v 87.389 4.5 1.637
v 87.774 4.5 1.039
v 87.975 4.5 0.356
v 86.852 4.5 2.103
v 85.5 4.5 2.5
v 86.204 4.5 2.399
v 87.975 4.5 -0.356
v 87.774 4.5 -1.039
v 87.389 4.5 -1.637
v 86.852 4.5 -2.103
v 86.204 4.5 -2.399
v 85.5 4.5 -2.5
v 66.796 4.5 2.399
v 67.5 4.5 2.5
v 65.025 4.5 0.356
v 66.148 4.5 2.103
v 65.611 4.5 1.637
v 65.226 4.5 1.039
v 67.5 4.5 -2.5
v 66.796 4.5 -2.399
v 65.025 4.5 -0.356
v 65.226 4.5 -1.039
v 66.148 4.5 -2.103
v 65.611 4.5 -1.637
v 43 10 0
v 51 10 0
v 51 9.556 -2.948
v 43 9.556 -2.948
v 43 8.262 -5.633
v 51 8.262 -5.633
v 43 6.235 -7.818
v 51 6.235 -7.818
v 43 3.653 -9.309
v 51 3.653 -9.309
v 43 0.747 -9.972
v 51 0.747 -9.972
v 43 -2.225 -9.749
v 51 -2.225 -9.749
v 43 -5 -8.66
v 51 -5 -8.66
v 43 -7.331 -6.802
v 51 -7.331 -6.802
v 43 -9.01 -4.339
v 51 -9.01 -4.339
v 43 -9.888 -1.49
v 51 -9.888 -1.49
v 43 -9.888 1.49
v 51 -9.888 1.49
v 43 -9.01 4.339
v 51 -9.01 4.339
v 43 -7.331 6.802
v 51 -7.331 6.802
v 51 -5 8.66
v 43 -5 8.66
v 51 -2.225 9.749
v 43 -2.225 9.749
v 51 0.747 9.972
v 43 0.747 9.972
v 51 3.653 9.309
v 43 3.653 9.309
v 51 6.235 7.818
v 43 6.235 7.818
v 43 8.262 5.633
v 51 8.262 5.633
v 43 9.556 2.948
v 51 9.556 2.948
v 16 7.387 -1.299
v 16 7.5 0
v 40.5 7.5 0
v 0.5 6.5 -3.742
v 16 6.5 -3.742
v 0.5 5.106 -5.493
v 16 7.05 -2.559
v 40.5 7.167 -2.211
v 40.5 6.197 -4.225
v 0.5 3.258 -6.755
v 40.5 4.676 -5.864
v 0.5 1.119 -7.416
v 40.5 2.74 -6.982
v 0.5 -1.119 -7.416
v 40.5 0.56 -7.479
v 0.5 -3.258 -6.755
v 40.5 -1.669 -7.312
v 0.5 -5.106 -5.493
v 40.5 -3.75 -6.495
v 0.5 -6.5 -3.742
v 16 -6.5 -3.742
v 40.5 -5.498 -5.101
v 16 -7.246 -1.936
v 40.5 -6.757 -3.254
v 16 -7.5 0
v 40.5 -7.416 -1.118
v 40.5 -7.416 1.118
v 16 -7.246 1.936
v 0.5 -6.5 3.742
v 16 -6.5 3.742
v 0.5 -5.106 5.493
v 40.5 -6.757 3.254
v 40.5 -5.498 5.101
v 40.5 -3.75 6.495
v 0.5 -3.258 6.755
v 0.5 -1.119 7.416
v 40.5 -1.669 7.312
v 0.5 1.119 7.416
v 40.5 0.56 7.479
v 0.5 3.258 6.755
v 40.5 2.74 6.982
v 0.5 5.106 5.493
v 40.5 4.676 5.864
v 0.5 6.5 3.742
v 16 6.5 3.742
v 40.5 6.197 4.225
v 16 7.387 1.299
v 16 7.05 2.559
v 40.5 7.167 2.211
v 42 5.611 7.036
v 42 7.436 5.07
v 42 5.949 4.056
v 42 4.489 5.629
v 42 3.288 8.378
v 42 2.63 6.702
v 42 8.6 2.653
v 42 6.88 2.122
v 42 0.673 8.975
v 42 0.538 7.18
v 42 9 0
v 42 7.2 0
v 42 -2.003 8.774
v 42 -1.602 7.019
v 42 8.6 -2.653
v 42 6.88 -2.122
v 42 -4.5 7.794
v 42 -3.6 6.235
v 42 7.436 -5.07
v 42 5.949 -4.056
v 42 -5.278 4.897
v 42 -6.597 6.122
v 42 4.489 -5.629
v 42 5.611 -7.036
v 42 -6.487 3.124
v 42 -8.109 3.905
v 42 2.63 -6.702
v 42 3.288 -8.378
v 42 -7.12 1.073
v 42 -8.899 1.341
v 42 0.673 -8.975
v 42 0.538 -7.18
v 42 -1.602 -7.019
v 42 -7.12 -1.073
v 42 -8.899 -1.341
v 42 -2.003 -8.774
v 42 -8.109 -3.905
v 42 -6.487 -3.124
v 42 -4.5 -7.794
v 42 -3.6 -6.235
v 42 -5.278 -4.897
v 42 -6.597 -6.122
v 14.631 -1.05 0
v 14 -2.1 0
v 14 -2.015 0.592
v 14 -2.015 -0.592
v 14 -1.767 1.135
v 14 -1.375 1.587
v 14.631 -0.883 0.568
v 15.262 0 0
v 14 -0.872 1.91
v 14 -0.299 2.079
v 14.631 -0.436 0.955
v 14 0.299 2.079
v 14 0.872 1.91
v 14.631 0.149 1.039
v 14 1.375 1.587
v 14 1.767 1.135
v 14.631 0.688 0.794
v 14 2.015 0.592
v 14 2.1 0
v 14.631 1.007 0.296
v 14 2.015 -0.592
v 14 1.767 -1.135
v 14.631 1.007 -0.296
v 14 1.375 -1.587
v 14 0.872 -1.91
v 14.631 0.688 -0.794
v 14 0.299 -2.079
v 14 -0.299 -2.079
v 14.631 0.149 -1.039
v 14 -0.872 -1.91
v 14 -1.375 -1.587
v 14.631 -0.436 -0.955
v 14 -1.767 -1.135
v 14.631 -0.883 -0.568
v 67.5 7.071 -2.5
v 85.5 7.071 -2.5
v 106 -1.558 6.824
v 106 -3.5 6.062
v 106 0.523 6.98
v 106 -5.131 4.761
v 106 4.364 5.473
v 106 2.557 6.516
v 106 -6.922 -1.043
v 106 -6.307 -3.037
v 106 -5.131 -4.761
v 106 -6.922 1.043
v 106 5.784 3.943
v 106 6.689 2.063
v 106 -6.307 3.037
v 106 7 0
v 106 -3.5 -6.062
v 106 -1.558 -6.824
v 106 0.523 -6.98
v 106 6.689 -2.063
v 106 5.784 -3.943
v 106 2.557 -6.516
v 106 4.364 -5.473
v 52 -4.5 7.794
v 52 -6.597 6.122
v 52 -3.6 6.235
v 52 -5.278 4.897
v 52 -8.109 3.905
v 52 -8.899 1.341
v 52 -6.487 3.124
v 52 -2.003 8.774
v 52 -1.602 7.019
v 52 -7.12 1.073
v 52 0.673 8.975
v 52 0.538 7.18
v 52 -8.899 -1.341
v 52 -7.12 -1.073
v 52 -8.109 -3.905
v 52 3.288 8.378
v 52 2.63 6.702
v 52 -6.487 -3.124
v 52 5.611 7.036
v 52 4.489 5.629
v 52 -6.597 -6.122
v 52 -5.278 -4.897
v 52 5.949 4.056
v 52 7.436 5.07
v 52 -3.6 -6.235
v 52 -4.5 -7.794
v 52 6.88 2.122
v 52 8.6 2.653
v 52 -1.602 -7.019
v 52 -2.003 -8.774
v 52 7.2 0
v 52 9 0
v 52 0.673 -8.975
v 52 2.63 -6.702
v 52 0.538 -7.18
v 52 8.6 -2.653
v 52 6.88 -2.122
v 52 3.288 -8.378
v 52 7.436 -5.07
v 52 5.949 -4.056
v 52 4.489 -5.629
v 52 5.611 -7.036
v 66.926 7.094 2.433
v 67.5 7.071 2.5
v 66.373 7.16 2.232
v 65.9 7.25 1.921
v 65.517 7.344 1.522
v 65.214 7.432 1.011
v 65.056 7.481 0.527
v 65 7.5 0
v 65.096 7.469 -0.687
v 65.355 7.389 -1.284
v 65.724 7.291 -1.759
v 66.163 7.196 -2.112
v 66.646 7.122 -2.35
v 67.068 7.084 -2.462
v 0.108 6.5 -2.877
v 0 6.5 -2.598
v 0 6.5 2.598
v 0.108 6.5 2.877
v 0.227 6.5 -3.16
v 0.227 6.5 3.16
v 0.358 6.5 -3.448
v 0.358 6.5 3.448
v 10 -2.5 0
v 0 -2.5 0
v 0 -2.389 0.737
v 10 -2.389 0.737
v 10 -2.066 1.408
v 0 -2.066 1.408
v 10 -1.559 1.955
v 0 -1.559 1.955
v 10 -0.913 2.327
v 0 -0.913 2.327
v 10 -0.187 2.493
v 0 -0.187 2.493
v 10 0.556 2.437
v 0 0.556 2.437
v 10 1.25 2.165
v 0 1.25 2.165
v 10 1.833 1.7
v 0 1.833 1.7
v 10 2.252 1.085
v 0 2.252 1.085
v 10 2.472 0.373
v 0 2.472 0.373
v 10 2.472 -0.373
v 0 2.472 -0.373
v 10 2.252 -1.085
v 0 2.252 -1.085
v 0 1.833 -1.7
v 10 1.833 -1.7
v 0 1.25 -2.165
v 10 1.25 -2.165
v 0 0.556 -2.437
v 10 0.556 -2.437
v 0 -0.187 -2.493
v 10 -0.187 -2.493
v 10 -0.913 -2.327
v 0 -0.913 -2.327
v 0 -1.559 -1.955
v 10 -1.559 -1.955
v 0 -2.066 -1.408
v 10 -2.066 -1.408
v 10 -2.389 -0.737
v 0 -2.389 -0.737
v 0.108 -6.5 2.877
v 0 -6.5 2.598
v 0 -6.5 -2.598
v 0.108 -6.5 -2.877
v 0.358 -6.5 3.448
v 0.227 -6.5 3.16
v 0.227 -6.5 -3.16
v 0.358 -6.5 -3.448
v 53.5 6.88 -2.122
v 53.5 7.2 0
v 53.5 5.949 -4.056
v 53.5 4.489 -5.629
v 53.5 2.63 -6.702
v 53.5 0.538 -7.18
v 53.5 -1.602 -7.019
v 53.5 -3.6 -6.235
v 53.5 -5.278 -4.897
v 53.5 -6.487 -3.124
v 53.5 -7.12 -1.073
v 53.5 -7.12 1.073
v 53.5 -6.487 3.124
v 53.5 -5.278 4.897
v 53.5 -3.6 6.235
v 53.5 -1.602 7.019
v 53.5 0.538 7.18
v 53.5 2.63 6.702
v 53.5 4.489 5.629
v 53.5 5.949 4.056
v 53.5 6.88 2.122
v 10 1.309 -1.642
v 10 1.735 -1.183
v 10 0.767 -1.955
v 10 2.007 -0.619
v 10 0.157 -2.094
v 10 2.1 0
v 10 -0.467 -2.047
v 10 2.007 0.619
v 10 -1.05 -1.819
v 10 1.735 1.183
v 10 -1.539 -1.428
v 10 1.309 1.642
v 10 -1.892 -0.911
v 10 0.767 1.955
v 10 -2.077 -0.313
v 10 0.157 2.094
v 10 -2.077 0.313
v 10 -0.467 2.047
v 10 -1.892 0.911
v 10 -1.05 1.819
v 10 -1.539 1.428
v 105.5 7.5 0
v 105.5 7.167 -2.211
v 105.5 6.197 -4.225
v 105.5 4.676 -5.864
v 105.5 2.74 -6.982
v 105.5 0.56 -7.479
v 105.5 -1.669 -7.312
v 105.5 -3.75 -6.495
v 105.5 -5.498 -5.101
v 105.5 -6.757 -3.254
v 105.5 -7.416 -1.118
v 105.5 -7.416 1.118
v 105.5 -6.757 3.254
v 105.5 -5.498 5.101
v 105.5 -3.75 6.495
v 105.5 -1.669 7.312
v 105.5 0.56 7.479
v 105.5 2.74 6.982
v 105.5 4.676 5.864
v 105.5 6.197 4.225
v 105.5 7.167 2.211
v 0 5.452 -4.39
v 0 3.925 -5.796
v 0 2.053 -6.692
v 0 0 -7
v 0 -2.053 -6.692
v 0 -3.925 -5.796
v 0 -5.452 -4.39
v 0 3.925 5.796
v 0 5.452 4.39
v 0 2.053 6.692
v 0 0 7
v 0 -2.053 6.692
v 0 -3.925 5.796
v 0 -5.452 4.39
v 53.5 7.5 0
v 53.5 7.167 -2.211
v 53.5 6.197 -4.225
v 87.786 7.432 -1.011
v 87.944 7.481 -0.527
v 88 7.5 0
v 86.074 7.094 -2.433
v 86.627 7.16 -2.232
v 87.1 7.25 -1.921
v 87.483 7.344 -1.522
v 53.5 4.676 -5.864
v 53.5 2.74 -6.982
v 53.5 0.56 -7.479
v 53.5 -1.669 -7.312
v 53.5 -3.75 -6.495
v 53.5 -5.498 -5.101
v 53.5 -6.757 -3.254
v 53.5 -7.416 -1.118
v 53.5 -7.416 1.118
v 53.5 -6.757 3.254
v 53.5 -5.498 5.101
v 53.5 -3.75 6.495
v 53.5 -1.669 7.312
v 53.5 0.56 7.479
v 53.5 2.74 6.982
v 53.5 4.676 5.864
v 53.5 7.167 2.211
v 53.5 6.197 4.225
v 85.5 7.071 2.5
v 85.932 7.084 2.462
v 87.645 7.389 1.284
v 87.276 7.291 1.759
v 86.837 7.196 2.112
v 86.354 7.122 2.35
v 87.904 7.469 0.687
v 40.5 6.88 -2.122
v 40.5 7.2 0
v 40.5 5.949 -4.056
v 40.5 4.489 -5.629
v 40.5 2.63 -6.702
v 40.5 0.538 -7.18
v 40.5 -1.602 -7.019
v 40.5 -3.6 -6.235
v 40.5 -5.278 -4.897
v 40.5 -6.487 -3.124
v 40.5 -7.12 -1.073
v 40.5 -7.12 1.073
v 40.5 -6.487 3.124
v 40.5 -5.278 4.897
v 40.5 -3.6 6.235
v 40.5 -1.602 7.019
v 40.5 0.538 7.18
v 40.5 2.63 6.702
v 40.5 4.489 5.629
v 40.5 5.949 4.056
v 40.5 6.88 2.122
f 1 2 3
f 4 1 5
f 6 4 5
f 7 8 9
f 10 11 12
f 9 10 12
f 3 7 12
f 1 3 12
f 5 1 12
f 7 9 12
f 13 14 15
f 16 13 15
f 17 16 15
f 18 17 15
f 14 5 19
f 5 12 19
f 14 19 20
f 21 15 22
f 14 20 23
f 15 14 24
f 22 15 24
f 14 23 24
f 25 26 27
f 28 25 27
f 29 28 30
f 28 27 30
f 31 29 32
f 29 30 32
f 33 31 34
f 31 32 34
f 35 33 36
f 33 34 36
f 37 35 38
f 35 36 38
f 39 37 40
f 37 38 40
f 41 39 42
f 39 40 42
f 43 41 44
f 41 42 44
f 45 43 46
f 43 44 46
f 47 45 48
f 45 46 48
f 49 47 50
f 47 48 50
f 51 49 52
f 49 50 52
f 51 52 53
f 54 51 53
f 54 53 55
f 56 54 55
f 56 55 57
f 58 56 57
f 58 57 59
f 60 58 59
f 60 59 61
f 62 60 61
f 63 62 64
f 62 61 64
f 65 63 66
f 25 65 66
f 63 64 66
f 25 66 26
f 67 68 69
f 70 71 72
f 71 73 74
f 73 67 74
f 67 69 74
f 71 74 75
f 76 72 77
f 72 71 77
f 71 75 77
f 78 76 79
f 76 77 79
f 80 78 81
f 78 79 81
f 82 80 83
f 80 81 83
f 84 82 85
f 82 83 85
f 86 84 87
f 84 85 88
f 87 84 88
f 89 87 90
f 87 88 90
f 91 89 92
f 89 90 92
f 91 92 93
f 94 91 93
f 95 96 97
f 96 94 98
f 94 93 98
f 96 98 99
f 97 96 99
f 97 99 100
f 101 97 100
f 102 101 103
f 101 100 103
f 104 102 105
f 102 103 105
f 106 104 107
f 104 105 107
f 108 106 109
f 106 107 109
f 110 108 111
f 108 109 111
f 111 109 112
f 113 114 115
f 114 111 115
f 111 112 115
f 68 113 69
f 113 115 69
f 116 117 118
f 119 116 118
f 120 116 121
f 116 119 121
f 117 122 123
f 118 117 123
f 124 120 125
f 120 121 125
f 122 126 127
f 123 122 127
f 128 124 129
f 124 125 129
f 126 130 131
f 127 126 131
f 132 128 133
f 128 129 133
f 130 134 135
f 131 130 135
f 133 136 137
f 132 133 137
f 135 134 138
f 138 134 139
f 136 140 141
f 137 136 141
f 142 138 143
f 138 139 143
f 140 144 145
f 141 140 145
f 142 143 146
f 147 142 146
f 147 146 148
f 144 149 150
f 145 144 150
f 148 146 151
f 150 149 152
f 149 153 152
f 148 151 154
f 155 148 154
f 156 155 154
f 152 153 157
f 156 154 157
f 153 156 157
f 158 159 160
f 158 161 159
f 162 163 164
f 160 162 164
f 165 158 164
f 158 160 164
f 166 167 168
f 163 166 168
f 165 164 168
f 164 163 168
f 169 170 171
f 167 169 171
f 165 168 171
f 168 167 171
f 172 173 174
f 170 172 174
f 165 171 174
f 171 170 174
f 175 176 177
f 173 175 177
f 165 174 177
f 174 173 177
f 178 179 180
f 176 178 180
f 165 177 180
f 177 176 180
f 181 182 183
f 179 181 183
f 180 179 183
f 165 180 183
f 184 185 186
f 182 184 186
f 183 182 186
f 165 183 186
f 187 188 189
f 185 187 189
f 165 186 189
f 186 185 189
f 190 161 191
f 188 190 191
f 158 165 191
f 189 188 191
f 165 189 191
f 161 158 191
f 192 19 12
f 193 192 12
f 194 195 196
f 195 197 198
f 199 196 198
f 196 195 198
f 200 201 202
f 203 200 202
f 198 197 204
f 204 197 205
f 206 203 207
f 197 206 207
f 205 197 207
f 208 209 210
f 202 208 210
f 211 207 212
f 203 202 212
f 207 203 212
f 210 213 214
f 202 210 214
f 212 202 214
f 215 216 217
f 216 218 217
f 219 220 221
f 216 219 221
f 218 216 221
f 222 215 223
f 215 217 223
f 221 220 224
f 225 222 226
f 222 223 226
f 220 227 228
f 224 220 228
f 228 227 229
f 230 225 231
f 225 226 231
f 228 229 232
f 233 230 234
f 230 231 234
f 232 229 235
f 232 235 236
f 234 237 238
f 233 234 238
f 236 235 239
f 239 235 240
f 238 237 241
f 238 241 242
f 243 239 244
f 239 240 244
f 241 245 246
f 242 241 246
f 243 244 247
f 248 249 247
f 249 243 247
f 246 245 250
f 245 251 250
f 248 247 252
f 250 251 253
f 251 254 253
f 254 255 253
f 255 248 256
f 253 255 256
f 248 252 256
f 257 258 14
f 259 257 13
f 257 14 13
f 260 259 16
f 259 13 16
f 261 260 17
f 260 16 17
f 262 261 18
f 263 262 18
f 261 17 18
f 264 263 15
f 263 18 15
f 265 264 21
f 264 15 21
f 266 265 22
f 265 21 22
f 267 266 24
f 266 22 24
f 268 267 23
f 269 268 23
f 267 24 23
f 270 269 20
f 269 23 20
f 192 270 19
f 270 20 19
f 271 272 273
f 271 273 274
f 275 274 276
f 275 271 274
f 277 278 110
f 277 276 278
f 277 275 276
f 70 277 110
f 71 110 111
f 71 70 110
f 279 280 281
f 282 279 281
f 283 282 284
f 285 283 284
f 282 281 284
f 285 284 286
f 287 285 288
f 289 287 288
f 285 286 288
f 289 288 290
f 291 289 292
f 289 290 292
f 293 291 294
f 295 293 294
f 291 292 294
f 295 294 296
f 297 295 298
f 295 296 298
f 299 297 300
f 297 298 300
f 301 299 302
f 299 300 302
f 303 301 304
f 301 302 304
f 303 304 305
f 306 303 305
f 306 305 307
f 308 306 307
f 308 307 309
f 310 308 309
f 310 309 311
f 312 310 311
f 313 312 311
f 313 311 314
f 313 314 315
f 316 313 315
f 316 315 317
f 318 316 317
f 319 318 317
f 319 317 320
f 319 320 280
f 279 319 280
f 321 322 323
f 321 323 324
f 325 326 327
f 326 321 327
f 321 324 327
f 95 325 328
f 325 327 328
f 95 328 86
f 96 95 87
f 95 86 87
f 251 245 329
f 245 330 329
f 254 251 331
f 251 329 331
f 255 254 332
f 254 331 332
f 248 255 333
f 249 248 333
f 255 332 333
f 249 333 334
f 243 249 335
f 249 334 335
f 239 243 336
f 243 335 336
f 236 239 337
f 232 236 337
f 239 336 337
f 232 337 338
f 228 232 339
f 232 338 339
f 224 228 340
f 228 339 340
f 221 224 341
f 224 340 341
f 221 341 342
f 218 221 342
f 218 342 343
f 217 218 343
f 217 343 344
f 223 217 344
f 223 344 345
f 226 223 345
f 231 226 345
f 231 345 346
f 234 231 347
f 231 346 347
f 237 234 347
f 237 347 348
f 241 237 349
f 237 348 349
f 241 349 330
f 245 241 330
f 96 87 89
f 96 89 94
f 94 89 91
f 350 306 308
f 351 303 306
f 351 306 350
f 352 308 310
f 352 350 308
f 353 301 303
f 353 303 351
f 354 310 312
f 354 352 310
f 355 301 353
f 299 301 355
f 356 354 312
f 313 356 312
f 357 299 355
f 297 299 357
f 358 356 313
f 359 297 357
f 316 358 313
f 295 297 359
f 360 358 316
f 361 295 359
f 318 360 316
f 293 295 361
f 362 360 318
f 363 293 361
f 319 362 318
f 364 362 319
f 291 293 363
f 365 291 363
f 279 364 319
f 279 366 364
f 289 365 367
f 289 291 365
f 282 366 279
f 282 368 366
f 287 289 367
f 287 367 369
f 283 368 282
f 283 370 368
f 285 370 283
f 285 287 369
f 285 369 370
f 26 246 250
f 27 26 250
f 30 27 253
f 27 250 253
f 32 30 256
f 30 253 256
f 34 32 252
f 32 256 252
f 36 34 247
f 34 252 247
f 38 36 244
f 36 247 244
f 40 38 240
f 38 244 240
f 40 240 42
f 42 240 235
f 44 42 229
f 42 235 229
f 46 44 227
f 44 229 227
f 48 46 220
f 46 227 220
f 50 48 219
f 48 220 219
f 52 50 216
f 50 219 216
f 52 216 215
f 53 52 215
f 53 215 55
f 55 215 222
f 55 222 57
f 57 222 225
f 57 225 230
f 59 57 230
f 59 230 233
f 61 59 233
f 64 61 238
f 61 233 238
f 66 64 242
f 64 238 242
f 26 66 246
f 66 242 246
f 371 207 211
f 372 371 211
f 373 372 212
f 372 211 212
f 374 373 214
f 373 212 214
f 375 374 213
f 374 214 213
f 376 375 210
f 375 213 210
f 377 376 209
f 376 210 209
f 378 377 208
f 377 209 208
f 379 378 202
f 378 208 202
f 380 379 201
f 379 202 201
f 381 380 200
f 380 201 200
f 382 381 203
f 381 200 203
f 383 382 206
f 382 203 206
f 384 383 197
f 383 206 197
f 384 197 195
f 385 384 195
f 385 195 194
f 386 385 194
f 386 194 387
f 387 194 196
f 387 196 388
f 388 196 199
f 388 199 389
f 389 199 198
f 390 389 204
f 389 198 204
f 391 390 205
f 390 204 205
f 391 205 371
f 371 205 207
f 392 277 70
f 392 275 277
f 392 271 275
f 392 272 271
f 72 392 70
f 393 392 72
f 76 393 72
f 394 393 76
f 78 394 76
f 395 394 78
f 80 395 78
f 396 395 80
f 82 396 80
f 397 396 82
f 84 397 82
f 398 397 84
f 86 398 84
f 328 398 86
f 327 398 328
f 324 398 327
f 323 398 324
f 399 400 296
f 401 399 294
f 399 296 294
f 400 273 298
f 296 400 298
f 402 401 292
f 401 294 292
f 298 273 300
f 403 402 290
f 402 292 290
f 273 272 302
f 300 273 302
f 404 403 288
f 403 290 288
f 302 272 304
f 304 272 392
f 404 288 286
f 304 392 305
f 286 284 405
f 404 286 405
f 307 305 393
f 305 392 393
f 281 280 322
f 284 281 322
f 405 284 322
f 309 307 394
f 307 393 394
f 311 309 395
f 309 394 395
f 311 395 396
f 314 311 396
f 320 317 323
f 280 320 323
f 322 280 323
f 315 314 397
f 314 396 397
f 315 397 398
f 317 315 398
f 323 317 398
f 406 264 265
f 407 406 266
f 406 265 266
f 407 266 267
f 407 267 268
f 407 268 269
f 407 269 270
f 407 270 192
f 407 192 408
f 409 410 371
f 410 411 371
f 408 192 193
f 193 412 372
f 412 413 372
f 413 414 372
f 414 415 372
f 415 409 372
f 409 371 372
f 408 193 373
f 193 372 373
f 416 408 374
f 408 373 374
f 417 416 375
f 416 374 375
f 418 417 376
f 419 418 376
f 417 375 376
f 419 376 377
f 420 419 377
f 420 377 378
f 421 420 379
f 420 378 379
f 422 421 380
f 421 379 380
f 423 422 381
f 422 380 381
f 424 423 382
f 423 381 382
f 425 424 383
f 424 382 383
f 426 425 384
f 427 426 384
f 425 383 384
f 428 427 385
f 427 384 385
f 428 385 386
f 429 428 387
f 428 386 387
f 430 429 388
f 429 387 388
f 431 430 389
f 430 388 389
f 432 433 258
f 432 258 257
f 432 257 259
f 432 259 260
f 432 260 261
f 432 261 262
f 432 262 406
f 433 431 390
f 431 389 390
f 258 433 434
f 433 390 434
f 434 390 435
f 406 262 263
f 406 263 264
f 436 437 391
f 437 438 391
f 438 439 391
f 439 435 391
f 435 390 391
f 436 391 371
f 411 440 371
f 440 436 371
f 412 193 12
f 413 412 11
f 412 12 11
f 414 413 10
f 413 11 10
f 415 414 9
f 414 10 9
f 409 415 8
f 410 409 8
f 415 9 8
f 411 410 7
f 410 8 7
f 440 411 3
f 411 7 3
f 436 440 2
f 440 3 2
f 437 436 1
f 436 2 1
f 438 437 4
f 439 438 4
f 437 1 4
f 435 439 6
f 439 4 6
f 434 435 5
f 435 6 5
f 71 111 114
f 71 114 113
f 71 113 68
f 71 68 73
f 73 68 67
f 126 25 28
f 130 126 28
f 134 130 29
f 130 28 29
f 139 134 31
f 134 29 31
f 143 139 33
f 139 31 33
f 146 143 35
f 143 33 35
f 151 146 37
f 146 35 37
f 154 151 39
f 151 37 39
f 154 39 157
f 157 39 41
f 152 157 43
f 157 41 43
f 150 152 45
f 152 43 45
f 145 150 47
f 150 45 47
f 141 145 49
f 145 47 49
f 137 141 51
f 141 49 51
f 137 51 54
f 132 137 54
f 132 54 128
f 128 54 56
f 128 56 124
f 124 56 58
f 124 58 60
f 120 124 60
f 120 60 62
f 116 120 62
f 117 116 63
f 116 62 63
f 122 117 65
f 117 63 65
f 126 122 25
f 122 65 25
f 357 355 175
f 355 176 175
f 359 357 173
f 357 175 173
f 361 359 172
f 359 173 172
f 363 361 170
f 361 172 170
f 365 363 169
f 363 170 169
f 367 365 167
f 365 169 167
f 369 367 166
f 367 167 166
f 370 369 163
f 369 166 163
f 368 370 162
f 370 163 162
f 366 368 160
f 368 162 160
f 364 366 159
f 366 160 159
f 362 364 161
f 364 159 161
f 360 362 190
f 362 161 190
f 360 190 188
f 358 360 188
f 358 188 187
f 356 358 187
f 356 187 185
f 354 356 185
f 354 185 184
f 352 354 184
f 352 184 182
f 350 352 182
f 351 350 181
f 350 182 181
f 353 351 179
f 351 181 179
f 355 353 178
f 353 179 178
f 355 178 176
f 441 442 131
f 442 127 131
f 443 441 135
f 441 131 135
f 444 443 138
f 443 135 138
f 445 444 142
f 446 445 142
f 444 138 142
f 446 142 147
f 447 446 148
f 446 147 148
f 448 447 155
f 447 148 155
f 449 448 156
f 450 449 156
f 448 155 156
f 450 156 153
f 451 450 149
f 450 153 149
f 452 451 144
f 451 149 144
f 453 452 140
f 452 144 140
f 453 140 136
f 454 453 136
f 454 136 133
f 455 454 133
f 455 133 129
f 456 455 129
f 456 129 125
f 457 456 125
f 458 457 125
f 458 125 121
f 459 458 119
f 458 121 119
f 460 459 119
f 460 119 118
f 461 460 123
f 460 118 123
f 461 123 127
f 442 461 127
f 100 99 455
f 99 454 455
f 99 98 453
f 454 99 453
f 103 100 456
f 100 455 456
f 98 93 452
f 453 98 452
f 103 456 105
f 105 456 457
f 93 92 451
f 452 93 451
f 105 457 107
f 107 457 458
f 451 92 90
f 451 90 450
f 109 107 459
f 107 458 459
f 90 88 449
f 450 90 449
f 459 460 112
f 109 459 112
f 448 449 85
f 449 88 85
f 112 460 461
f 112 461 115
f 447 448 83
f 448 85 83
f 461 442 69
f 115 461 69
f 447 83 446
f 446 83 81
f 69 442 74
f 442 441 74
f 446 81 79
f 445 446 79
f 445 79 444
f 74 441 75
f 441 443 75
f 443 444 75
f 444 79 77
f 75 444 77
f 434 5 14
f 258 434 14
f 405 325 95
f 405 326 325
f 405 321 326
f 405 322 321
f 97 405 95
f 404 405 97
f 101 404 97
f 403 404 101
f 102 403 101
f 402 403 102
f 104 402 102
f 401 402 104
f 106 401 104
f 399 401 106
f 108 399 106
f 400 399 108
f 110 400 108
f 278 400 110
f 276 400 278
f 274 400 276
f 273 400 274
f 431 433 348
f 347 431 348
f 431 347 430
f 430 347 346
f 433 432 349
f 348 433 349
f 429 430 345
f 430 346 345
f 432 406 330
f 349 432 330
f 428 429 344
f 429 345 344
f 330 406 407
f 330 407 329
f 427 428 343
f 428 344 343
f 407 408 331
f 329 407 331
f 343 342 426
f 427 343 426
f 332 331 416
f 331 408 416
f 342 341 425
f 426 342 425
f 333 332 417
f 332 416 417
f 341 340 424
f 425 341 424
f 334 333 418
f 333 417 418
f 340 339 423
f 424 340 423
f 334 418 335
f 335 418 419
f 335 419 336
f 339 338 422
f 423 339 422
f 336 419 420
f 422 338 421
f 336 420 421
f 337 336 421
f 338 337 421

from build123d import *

# Parameters (mm, degrees)
CUT_EXTRUDE_1_DEPTH      = 107.939235082
CUT_EXTRUDE_1_DEPTH_BACK = 107.939235082
SKETCH_3_W               = 16
SKETCH_3_H               = 3.5
CUT_EXTRUDE_START        = 4.5
CUT_EXTRUDE_2_DEPTH      = 103.439235082
M5X0_8_1_D               = 4.2
M5X0_8_1_DEPTH           = 14
M5X0_8_1_CBORE_D         = 5
M5X0_8_1_CBORE_DEPTH     = 10
M5X0_8_1_TIP             = 1.2618073
CHAMFER_1_SIZE           = 1
CHAMFER_2_SIZE           = 0.5


with BuildPart() as part:
    # ｽｹｯﾁ5 → 回転1 (revolve)
    with BuildSketch(Plane.XY):
        Polygon((0, 0), (0, 7.5), (40.5, 7.5), (40.5, 7.2), (42, 7.2), (42, 10), (52, 10), (52, 7.2), (53.5, 7.2), (53.5, 7.5), (106, 7.5), (106, 0), align=None)
    revolve(axis=Axis((0, 0, 0), (-1, 0, 0)))

    # ｽｹｯﾁ3 → ｶｯﾄ - 押し出し1 (cut, two sides: drawn at the far end of the back side and taken through both)
    with BuildSketch(Plane.XY.offset(-CUT_EXTRUDE_1_DEPTH_BACK)):
        with Locations((8, 8.25)):
            Rectangle(SKETCH_3_W, SKETCH_3_H)
        with Locations((8, -8.25)):
            Rectangle(SKETCH_3_W, SKETCH_3_H)
    extrude(amount=CUT_EXTRUDE_1_DEPTH + CUT_EXTRUDE_1_DEPTH_BACK, mode=Mode.SUBTRACT)

    # ｽｹｯﾁ4 → ｶｯﾄ - 押し出し2 (cut, through all)
    with BuildSketch(Plane(origin=(0, 0, 0), x_dir=(1, 0, 0), z_dir=(0, 1, 0)).offset(CUT_EXTRUDE_START)):
        with BuildLine():
            Line((67.5, 2.5), (85.5, 2.5))
            ThreePointArc((85.5, 2.5), (88, 0), (85.5, -2.5))
            Line((85.5, -2.5), (67.5, -2.5))
            ThreePointArc((67.5, -2.5), (65, 0), (67.5, 2.5))
        make_face()
    extrude(amount=CUT_EXTRUDE_2_DEPTH, mode=Mode.SUBTRACT)

    # M5x0.8 ねじ穴1
    with Locations(Plane(origin=(0, 0, 0), x_dir=(0, -1, 0), z_dir=(-1, 0, 0))):
        with Locations((0, 0)):
            CounterBoreHole(M5X0_8_1_D / 2, M5X0_8_1_CBORE_D / 2, M5X0_8_1_CBORE_DEPTH, depth=M5X0_8_1_DEPTH)
            with Locations((0, 0, -(M5X0_8_1_DEPTH + M5X0_8_1_TIP / 2))):  # 118° drill point
                Cone(0, M5X0_8_1_D / 2, M5X0_8_1_TIP, mode=Mode.SUBTRACT)

    # 面取り1
    chamfer_1_edges = [part.edges().sort_by_distance(p)[0] for p in [
        (52, -10, 0),
        (42, -10, 0),
    ]]
    chamfer(chamfer_1_edges, length=CHAMFER_1_SIZE)

    # 面取り2
    chamfer_2_edges = [part.edges().sort_by_distance(p)[0] for p in [
        (0, 0, 7.5),
        (0, 0, -7.5),
        (106, -7.5, 0),
    ]]
    chamfer(chamfer_2_edges, length=CHAMFER_2_SIZE)


solid = part.part
